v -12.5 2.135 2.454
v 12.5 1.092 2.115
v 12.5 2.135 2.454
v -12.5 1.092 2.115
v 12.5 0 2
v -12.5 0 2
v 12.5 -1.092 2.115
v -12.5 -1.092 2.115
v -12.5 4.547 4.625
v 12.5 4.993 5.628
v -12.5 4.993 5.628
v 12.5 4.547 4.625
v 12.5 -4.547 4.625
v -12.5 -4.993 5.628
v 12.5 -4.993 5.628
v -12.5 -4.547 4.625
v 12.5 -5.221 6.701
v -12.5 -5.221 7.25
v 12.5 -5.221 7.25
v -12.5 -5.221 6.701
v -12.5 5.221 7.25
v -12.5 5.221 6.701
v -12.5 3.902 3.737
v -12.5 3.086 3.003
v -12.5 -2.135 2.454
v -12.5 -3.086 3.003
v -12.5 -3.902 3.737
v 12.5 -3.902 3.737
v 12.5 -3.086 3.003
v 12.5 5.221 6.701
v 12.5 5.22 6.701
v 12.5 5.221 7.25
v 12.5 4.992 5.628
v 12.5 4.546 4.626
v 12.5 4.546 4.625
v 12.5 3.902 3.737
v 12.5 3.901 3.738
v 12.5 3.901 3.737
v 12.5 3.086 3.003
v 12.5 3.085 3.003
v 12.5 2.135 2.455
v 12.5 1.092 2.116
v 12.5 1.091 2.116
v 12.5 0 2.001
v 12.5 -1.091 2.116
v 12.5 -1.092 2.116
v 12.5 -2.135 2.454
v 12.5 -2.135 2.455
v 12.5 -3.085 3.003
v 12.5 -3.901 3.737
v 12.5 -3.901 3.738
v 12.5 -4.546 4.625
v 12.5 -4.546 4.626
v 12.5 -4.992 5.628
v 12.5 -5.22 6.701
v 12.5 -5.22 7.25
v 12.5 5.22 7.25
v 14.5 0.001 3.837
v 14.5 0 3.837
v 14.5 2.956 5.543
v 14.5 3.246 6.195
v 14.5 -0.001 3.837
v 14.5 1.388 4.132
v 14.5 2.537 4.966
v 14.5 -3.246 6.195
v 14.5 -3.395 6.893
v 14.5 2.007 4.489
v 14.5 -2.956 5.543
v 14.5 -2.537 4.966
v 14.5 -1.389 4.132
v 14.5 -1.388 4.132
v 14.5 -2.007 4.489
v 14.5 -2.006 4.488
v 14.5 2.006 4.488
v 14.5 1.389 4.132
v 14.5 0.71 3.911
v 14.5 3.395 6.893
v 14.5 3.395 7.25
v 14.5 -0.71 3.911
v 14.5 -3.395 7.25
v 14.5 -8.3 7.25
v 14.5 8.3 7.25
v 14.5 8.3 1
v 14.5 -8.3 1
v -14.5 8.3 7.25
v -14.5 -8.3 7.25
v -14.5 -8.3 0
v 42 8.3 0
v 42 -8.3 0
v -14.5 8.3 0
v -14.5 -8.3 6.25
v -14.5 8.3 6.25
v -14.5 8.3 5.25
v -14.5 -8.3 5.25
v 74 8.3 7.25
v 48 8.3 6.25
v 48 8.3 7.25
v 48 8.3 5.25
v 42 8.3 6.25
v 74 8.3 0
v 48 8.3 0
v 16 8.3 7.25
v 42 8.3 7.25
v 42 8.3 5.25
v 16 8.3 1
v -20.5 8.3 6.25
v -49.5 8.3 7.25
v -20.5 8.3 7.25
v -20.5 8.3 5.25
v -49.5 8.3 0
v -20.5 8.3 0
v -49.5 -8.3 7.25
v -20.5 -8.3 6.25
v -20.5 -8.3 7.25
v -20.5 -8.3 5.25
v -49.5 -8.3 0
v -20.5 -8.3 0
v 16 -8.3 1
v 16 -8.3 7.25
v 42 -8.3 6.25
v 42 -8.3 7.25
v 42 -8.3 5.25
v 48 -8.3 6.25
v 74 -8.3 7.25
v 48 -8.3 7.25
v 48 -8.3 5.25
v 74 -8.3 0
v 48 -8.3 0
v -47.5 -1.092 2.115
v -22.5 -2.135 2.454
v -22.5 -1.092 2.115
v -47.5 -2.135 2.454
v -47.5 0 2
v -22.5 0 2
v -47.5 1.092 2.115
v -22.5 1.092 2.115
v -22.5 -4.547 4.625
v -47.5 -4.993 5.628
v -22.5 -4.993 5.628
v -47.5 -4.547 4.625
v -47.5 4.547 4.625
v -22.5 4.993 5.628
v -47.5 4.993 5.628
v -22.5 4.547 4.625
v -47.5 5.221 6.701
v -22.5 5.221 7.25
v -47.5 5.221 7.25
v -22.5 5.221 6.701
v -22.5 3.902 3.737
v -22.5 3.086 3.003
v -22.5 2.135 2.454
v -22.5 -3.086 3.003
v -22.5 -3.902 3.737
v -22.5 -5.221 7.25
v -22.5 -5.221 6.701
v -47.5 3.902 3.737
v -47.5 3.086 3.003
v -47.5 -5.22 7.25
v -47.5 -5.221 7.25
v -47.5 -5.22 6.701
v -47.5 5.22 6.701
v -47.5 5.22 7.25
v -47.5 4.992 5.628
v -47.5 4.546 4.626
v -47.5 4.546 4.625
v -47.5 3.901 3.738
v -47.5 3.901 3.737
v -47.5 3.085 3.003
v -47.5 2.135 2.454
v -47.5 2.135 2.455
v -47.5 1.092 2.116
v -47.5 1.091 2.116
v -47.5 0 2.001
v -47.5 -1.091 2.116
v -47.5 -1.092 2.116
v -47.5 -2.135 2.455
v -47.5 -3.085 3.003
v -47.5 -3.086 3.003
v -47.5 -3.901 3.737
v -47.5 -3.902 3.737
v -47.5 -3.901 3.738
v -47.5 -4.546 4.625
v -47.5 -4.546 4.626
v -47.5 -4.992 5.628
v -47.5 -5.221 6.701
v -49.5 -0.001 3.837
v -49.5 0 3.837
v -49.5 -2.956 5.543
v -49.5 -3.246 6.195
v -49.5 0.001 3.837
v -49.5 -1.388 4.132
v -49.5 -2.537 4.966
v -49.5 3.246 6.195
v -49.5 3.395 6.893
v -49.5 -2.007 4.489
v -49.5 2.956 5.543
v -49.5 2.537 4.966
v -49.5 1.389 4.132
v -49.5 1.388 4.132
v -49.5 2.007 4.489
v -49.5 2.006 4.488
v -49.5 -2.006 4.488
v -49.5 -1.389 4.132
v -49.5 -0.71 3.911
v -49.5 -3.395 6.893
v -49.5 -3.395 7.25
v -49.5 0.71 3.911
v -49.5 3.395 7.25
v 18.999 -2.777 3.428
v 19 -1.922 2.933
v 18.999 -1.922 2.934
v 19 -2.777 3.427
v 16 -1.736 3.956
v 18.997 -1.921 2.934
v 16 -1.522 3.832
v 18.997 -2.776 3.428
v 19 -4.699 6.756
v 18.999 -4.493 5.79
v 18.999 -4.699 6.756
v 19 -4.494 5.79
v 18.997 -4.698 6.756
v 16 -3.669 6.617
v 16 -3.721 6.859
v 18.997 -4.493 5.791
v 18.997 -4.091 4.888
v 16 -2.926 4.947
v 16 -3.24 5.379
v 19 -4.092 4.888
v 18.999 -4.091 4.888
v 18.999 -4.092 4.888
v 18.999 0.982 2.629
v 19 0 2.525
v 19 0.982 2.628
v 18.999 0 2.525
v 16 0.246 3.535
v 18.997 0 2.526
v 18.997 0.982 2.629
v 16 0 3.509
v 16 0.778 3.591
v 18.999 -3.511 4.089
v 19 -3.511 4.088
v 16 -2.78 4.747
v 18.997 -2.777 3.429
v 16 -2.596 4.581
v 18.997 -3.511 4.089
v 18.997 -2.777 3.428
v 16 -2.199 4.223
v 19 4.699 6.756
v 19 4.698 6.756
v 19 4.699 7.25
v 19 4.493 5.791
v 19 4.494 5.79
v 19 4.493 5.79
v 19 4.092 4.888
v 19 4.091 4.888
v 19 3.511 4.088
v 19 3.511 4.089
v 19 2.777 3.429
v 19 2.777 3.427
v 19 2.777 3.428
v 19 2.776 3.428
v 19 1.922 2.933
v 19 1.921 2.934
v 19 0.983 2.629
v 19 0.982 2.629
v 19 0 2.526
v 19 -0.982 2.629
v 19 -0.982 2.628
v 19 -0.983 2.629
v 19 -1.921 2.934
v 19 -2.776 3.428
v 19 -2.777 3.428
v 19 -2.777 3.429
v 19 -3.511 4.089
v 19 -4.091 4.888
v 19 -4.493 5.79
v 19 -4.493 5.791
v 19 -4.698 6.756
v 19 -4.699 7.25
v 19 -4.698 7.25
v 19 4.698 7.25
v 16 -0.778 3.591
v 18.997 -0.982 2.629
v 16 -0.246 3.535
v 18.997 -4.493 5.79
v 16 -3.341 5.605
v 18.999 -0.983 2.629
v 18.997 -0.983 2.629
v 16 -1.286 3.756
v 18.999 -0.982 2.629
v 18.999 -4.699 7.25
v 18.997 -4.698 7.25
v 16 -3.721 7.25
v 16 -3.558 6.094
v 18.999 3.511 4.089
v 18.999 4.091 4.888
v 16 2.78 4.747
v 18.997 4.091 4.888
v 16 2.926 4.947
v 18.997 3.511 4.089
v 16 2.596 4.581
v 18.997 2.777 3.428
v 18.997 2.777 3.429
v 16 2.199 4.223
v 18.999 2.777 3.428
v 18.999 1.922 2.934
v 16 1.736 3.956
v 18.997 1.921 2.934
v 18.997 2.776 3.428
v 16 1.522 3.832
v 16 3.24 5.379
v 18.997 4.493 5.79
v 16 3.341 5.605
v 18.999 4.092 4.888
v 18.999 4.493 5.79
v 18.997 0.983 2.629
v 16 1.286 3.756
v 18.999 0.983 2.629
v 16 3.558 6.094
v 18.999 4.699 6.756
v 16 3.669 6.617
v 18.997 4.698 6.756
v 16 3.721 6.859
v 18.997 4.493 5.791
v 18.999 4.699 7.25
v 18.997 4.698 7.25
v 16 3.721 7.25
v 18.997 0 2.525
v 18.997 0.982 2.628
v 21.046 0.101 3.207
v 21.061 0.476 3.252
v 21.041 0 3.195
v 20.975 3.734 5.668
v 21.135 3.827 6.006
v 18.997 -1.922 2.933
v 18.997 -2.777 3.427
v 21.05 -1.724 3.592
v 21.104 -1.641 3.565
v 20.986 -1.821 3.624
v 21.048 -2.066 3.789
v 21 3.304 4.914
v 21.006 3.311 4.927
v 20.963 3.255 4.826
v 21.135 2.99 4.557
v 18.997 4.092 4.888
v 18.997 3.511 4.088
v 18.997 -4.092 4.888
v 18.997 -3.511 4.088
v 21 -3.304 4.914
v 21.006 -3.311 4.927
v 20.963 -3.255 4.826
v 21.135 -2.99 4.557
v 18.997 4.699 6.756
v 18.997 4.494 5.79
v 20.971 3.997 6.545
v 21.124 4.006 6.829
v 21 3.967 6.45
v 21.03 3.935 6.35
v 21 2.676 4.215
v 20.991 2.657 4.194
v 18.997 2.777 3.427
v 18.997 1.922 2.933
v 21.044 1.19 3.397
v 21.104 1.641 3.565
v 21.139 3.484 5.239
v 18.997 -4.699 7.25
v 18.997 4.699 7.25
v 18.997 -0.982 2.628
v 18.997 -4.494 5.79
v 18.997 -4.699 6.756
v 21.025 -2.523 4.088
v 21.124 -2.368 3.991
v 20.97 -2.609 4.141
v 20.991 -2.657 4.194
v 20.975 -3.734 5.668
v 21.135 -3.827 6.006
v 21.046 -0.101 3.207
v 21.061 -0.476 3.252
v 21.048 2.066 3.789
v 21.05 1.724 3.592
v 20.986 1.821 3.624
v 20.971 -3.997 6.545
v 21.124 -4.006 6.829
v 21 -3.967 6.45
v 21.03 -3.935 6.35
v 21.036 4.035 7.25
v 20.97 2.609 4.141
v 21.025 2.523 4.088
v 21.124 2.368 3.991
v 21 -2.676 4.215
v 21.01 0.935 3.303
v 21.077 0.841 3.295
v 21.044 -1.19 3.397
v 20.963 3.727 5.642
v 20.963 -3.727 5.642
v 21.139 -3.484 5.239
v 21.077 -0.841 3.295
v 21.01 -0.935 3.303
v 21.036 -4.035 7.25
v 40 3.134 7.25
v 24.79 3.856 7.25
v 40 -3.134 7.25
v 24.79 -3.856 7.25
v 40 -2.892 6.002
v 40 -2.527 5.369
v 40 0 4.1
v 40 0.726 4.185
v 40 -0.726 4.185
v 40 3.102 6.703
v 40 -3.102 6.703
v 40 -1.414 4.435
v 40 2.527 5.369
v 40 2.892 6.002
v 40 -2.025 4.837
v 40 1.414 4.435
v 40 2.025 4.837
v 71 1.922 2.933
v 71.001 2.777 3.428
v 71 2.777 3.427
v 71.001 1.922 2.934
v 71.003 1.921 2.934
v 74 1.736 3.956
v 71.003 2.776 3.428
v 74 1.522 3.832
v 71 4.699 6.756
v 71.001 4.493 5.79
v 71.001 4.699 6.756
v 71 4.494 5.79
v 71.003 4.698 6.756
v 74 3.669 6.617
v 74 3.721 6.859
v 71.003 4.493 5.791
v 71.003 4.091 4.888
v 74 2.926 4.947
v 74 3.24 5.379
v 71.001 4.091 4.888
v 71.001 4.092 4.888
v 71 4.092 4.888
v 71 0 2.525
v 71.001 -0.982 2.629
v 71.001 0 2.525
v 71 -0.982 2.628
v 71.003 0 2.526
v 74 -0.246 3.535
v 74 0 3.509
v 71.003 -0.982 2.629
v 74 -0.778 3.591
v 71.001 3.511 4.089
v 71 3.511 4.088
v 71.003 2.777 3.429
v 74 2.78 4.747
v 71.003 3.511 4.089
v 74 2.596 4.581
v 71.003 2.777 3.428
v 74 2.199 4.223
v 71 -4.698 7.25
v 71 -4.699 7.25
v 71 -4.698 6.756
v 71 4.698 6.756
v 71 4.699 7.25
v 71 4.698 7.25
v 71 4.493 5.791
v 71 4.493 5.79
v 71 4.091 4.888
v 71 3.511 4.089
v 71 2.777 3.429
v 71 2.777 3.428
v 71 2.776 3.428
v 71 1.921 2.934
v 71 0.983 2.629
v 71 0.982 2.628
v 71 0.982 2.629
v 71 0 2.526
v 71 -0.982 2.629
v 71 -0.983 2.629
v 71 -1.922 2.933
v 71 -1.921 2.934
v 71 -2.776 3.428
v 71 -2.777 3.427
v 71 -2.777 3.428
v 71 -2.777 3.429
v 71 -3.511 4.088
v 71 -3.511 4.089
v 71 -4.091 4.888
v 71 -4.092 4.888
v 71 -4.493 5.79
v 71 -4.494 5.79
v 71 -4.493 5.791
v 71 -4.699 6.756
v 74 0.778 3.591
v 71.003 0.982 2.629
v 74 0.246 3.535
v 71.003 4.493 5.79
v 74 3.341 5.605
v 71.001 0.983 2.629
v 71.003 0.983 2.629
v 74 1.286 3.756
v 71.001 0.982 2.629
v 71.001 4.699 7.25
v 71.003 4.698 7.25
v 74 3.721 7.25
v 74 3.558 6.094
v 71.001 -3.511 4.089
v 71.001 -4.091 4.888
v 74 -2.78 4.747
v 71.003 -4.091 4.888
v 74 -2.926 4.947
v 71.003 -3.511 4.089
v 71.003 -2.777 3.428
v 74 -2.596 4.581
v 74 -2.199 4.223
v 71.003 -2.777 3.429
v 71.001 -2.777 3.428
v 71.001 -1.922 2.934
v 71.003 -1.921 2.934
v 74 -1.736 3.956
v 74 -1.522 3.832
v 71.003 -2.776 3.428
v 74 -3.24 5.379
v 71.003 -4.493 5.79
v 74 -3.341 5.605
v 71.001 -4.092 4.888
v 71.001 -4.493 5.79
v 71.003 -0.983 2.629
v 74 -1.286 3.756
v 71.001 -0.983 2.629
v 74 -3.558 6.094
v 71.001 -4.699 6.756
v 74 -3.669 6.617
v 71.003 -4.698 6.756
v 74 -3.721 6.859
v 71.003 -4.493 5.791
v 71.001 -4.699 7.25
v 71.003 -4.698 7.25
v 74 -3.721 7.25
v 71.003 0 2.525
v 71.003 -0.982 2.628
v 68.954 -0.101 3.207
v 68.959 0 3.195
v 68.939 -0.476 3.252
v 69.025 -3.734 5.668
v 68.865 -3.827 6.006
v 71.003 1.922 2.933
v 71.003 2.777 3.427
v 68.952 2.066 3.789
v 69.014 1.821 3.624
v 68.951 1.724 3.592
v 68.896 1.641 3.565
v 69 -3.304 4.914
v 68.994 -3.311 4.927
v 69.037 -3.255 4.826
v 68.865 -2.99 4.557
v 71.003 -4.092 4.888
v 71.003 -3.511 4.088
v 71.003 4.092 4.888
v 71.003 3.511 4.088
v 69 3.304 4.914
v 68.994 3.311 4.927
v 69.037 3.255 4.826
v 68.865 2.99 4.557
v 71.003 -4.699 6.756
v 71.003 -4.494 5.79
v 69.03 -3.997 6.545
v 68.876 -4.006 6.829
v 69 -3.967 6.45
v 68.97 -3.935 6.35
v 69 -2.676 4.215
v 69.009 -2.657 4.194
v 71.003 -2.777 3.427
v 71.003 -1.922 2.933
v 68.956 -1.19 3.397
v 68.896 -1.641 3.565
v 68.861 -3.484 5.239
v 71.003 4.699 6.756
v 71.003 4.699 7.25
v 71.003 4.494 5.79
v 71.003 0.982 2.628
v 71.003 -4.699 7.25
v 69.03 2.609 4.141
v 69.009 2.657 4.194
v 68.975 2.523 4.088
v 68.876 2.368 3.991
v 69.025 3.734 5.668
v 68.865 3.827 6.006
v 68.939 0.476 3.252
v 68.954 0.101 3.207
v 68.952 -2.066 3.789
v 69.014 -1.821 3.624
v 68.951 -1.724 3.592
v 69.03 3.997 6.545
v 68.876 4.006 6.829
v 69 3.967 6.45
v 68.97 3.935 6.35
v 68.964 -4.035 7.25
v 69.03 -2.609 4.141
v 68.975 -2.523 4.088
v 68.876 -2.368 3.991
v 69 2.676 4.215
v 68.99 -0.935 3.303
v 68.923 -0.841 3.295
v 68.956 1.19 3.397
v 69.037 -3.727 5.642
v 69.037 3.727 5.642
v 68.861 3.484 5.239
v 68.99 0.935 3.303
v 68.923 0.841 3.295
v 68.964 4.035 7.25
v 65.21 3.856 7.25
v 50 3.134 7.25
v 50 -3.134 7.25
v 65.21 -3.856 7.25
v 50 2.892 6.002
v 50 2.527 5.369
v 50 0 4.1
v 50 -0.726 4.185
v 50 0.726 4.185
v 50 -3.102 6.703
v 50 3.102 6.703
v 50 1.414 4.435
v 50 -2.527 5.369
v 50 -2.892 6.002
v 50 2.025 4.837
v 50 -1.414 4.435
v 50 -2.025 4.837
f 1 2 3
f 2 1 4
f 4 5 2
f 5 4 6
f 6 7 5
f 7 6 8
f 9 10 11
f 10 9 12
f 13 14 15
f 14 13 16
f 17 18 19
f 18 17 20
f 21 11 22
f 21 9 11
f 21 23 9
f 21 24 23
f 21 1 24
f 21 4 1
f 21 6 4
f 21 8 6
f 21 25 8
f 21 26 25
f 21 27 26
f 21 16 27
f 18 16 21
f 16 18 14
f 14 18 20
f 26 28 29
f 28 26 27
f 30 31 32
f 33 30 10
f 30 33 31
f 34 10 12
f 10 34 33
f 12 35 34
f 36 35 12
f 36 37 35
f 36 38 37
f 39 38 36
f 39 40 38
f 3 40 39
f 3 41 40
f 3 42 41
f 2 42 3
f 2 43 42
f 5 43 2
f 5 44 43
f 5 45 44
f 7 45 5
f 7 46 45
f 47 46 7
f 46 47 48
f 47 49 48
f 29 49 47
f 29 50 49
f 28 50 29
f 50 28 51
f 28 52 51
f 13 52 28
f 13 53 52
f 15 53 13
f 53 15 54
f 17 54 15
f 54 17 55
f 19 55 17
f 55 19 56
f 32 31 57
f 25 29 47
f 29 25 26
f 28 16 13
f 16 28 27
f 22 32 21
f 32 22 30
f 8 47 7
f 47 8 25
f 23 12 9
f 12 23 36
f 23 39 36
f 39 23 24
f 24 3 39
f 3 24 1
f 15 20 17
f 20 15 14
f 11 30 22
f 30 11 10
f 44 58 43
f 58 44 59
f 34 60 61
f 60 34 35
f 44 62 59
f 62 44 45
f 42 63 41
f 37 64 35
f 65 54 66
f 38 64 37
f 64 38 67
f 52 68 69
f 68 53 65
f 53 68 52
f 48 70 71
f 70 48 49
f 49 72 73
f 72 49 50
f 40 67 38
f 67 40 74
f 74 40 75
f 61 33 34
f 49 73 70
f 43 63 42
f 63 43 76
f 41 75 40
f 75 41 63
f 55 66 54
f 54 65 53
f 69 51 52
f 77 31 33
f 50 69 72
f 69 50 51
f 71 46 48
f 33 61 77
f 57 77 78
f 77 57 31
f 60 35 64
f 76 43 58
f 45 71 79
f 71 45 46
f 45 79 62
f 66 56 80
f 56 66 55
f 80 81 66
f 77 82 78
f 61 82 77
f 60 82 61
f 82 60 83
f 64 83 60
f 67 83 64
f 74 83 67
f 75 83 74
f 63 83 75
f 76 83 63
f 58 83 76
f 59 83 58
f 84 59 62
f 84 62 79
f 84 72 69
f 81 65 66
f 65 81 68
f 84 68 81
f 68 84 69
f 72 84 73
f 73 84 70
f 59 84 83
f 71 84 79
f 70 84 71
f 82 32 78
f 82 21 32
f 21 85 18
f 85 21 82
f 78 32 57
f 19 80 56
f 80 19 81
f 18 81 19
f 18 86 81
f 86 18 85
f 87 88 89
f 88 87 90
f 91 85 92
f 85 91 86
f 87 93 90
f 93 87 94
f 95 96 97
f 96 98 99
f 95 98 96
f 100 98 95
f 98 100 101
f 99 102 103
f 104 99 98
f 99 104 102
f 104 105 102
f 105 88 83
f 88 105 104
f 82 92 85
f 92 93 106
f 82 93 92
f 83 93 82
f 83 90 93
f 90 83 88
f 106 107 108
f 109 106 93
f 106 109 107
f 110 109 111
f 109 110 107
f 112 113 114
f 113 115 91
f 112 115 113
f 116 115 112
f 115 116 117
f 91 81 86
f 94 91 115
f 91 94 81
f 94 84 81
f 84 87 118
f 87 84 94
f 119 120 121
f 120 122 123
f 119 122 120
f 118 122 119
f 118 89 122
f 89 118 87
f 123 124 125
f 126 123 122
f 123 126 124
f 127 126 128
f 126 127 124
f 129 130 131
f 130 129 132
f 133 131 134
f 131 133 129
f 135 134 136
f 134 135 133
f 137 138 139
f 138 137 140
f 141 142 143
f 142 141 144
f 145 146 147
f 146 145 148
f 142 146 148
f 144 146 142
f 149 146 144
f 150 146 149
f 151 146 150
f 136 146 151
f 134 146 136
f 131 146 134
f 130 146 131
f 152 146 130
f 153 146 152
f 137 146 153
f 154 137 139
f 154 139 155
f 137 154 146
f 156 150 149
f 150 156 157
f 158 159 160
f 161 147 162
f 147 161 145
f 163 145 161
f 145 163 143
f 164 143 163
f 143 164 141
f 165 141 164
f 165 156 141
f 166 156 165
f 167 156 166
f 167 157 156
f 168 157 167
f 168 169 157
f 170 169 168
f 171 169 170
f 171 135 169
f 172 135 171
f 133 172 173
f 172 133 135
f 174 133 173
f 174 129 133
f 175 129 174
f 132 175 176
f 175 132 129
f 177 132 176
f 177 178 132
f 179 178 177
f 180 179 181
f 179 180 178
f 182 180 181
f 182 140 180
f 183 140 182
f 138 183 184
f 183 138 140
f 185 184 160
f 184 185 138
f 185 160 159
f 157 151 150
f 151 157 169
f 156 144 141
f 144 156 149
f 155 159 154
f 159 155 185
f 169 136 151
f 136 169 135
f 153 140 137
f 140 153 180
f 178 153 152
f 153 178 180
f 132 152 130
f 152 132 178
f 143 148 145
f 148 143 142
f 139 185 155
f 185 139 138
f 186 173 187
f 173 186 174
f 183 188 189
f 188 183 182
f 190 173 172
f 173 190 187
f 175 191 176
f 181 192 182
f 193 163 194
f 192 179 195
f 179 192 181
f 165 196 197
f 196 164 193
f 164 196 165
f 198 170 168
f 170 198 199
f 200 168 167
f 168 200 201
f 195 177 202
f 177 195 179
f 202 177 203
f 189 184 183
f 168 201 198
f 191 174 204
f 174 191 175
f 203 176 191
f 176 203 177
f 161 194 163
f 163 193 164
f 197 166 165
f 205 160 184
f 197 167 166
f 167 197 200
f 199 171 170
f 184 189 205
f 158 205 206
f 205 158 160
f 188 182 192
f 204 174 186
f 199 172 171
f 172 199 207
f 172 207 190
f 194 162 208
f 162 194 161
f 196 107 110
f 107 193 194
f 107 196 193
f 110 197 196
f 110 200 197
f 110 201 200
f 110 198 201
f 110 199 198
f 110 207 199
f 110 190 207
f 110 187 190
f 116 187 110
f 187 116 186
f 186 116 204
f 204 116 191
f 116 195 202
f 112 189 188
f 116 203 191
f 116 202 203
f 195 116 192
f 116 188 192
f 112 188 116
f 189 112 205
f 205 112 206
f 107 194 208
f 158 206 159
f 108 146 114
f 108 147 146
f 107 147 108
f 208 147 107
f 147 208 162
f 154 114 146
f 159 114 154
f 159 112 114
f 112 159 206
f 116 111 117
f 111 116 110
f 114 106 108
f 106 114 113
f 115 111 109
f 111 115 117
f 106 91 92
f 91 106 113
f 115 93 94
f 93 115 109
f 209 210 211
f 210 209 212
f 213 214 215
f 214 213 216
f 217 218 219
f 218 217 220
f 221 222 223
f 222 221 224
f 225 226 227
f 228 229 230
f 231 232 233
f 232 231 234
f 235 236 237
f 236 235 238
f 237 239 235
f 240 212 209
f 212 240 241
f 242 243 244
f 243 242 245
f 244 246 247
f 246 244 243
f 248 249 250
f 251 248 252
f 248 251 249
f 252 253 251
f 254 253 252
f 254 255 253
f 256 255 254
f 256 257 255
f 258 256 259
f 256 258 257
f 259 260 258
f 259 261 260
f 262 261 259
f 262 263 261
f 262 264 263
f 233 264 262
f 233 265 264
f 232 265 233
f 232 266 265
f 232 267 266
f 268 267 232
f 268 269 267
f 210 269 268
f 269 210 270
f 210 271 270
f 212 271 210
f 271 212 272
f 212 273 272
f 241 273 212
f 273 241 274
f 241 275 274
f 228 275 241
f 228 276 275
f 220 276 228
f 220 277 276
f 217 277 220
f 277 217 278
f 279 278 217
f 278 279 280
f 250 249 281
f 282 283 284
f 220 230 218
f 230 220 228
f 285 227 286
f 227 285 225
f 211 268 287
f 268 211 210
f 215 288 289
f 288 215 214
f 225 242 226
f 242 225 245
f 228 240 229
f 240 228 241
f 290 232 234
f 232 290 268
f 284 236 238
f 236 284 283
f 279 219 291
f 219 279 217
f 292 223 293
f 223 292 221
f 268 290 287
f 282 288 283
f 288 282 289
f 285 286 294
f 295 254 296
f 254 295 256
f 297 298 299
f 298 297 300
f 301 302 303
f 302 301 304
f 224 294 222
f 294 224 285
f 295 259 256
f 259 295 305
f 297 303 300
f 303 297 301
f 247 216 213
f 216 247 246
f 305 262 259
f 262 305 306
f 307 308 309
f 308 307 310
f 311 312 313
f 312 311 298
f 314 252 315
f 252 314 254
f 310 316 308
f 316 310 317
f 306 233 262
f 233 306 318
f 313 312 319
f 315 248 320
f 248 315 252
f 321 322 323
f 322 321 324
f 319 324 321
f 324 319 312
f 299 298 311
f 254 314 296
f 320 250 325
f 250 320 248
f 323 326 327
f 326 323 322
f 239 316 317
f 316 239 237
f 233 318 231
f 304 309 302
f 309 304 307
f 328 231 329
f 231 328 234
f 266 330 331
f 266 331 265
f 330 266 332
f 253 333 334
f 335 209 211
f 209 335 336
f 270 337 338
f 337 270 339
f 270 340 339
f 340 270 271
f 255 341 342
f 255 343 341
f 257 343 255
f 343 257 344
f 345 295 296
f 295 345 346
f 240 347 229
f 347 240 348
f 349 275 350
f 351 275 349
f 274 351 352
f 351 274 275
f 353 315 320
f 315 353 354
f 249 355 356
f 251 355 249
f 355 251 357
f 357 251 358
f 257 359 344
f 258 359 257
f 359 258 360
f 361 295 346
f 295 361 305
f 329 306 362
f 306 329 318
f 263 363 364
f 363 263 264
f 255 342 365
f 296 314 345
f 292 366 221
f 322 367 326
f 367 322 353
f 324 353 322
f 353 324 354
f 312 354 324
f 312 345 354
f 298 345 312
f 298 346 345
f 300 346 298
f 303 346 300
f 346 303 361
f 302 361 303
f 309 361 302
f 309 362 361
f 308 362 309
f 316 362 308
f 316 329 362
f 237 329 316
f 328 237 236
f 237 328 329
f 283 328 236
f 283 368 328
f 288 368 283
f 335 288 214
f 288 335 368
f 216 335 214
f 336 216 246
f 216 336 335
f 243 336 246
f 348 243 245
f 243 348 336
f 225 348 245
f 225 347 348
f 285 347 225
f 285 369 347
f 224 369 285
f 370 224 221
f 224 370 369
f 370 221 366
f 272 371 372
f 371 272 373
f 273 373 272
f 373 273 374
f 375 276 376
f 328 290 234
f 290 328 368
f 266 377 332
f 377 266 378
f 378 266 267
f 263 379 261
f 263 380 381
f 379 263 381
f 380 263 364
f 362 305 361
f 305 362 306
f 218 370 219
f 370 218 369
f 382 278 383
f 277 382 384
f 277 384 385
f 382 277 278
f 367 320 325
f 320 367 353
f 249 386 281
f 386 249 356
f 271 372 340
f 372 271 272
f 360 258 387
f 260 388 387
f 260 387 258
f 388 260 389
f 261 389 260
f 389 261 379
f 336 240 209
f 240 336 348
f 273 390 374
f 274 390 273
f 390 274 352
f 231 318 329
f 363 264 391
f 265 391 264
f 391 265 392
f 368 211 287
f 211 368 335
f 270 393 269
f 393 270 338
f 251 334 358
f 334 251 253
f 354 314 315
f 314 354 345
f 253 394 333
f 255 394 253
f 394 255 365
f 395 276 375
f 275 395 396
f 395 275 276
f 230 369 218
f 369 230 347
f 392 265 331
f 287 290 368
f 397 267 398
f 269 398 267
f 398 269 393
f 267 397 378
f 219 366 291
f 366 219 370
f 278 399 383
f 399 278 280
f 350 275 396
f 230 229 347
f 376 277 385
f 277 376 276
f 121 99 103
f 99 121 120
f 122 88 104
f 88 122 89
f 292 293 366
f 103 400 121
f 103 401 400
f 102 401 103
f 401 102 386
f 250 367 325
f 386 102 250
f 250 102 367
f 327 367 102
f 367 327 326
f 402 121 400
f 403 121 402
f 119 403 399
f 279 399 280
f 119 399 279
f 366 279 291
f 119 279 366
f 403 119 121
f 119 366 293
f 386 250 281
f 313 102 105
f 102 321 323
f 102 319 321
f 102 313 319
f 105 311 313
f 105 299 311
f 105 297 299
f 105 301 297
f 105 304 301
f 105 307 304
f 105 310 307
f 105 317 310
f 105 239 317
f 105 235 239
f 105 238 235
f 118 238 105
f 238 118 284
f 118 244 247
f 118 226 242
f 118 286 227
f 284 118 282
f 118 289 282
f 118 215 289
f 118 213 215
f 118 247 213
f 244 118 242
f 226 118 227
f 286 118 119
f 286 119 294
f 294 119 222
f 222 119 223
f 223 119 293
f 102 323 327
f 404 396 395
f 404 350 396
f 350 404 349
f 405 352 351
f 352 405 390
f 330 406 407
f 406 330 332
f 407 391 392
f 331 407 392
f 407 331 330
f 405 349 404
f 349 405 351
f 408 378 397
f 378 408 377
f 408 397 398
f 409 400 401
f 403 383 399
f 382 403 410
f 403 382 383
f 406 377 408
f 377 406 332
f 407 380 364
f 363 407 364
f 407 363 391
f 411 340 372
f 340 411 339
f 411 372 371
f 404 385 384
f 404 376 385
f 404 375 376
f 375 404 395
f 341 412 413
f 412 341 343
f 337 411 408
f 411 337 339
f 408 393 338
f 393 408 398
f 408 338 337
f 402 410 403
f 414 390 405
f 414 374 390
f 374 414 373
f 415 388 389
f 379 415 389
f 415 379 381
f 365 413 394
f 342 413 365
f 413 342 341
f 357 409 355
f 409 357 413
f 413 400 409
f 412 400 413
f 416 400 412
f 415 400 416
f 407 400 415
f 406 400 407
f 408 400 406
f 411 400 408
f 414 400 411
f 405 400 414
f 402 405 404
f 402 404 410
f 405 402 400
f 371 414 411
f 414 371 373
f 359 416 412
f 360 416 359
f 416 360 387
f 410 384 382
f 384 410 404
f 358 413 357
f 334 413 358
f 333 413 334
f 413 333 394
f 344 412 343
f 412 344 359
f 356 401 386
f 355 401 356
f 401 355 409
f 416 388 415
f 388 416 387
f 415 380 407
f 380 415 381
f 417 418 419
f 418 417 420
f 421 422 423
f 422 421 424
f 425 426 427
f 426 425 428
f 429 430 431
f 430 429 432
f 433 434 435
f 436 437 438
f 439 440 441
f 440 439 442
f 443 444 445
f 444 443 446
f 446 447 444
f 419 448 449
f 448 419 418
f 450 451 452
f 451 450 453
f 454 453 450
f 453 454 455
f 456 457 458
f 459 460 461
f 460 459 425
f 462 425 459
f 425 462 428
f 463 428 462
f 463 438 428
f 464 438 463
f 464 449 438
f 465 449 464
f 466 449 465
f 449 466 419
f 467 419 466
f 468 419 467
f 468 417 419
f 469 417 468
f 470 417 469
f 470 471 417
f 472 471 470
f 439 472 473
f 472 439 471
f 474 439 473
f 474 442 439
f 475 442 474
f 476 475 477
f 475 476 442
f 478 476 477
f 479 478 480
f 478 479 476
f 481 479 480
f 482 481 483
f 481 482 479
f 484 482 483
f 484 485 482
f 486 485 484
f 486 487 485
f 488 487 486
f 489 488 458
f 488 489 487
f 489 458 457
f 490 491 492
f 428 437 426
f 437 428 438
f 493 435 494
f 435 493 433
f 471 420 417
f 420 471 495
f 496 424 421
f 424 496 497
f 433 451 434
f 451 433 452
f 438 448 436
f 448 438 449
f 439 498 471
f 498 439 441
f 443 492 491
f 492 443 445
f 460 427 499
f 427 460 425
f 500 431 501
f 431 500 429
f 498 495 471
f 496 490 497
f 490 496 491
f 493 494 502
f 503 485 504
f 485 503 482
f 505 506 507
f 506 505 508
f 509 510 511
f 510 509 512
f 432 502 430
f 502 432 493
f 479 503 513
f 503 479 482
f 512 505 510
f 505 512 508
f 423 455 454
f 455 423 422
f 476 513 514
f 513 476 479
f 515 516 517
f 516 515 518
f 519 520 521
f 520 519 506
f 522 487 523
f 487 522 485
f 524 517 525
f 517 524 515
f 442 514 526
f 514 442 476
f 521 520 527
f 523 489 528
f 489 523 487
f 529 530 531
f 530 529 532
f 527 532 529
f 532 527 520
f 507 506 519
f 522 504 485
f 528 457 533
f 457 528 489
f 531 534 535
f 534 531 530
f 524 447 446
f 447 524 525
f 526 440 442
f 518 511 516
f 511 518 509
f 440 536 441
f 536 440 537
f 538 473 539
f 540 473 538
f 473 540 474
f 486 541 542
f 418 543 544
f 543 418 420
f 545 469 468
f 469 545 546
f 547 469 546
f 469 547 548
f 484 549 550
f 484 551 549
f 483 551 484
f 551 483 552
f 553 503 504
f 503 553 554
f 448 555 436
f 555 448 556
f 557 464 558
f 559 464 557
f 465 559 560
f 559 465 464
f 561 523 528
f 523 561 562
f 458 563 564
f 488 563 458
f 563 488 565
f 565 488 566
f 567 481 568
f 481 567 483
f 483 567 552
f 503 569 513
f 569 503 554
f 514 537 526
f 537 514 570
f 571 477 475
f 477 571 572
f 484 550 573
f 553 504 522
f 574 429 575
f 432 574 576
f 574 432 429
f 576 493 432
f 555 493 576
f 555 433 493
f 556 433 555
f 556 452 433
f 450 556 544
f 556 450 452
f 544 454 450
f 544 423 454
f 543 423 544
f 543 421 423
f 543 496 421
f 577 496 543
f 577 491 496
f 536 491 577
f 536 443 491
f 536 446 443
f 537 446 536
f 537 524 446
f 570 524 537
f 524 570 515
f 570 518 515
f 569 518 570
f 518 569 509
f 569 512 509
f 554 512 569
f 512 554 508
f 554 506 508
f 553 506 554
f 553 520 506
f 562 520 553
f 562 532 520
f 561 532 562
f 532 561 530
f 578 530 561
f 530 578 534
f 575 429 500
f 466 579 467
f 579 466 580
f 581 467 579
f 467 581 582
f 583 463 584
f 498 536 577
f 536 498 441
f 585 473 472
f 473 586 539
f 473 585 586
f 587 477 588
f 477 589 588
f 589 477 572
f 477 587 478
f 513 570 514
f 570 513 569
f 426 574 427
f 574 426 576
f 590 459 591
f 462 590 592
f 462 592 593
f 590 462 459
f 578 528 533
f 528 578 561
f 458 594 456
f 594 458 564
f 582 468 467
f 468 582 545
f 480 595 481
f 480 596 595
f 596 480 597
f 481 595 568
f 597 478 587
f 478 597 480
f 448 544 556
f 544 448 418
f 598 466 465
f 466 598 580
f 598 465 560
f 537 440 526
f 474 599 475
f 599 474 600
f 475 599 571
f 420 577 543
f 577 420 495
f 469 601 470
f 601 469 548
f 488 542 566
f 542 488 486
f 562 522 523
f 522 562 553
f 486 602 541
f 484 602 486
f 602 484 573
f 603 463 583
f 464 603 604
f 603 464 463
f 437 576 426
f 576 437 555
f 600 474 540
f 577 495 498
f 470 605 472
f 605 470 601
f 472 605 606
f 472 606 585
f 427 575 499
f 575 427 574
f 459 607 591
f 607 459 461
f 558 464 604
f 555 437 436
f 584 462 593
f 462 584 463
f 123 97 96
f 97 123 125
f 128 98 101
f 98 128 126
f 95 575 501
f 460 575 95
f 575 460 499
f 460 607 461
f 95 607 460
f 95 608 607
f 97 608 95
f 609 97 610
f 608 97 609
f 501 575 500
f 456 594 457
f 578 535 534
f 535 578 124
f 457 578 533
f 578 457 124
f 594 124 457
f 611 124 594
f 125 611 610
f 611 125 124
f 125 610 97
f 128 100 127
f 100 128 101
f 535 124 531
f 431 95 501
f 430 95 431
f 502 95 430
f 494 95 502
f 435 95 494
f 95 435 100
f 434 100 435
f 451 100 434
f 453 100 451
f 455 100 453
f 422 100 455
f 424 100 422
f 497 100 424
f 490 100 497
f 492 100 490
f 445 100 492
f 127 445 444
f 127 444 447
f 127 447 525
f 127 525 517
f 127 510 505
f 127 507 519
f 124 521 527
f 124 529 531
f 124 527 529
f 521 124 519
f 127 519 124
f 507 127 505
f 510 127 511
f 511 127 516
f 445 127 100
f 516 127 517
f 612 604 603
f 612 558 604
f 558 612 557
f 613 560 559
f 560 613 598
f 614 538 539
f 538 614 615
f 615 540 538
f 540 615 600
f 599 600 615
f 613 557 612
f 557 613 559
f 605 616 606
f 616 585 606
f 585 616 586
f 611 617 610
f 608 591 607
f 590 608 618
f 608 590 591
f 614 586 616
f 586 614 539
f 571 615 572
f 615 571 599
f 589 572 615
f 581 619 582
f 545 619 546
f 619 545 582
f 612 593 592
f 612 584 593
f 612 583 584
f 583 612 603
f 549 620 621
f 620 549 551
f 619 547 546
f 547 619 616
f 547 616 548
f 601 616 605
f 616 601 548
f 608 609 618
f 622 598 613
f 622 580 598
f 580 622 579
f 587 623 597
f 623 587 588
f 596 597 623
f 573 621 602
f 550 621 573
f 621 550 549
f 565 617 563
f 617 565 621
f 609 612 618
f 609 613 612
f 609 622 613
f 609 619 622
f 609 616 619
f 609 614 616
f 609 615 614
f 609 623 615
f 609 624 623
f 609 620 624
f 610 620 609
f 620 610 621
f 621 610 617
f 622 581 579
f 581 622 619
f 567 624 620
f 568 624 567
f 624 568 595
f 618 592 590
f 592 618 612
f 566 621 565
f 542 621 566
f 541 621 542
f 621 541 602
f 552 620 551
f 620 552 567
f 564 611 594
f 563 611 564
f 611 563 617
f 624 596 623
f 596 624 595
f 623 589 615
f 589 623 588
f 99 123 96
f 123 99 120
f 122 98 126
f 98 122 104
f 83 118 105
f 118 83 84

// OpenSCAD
// Ampoule Snapper

// Ampoule diameter
amp_d = 10.5;
// Ampoule base length
amp_b = 25;
// Ampoule top length
amp_t = 22;

// Wall thickness
wall_t = 2;

// Bendy coupler length for middle joint
coupler_l = 1.5;
// Bendy coupler length for outer joint
coupler_top_l = 6;
// Bendy coupler thickness
coupler_h = 1;

/* [Hidden] */
$fs=1;
zilch=0.001;
block_h = amp_d/2+wall_t;
block_w = amp_d*1.2+wall_t*2;
block_base_l = amp_b+wall_t*2;
block_top_l = amp_t+wall_t*2;

module block_base() {
    difference() {
        translate([0,0,block_h/2])
        cube([block_base_l, block_w, block_h], center=true);
        
        translate([0,0,block_h]) rotate([0,90,0]) {
            cylinder(d=amp_d, h=amp_b, center=true);
            translate([0,0,amp_b/2-zilch]) cylinder(d1=amp_d, d2=amp_d*0.65, h=wall_t+zilch*2);
        }
    }
}

module block_top() {
    difference() {
        translate([0,0,block_h/2])
        cube([block_top_l, block_w, block_h], center=true);
        
        translate([0,0,block_h]) rotate([0,90,0]) {
            cylinder(d1=amp_d*0.8, d2=amp_d*0.6, h=amp_t, center=true);
        }
        top_bulge = wall_t*2;
        translate([-block_top_l/2+wall_t/2-zilch,0,block_h]) rotate([0,90,0]) {
            cylinder(d1=amp_d*0.65, d2=amp_d*0.9, h=top_bulge+zilch*3, center=true);
            translate([0,0,top_bulge]) cylinder(d1=amp_d*0.9, d2=amp_d*0.65, h=top_bulge +zilch*3, center=true);
        }
    }
}

translate([-block_base_l/2,0,]) {
    rotate(180) {
        translate([0,-block_w/2,block_h-coupler_h*2]) cube([coupler_top_l, block_w, coupler_h]);
        translate([block_base_l/2+coupler_top_l,0,0])
        block_base();
    }
}
block_base();
translate([block_base_l/2,0,]) {
    translate([0,-block_w/2,0]) cube([coupler_l, block_w, coupler_h]);
    translate([coupler_l+block_top_l/2,0,0]) {
        block_top();
        translate([block_top_l/2,0,0]) {
            translate([0,-block_w/2,block_h-coupler_h*2]) cube([coupler_top_l, block_w, coupler_h]);
            translate([coupler_top_l+block_top_l/2,0,0]) {
                rotate(180) block_top();
            }
        }
    }
}
